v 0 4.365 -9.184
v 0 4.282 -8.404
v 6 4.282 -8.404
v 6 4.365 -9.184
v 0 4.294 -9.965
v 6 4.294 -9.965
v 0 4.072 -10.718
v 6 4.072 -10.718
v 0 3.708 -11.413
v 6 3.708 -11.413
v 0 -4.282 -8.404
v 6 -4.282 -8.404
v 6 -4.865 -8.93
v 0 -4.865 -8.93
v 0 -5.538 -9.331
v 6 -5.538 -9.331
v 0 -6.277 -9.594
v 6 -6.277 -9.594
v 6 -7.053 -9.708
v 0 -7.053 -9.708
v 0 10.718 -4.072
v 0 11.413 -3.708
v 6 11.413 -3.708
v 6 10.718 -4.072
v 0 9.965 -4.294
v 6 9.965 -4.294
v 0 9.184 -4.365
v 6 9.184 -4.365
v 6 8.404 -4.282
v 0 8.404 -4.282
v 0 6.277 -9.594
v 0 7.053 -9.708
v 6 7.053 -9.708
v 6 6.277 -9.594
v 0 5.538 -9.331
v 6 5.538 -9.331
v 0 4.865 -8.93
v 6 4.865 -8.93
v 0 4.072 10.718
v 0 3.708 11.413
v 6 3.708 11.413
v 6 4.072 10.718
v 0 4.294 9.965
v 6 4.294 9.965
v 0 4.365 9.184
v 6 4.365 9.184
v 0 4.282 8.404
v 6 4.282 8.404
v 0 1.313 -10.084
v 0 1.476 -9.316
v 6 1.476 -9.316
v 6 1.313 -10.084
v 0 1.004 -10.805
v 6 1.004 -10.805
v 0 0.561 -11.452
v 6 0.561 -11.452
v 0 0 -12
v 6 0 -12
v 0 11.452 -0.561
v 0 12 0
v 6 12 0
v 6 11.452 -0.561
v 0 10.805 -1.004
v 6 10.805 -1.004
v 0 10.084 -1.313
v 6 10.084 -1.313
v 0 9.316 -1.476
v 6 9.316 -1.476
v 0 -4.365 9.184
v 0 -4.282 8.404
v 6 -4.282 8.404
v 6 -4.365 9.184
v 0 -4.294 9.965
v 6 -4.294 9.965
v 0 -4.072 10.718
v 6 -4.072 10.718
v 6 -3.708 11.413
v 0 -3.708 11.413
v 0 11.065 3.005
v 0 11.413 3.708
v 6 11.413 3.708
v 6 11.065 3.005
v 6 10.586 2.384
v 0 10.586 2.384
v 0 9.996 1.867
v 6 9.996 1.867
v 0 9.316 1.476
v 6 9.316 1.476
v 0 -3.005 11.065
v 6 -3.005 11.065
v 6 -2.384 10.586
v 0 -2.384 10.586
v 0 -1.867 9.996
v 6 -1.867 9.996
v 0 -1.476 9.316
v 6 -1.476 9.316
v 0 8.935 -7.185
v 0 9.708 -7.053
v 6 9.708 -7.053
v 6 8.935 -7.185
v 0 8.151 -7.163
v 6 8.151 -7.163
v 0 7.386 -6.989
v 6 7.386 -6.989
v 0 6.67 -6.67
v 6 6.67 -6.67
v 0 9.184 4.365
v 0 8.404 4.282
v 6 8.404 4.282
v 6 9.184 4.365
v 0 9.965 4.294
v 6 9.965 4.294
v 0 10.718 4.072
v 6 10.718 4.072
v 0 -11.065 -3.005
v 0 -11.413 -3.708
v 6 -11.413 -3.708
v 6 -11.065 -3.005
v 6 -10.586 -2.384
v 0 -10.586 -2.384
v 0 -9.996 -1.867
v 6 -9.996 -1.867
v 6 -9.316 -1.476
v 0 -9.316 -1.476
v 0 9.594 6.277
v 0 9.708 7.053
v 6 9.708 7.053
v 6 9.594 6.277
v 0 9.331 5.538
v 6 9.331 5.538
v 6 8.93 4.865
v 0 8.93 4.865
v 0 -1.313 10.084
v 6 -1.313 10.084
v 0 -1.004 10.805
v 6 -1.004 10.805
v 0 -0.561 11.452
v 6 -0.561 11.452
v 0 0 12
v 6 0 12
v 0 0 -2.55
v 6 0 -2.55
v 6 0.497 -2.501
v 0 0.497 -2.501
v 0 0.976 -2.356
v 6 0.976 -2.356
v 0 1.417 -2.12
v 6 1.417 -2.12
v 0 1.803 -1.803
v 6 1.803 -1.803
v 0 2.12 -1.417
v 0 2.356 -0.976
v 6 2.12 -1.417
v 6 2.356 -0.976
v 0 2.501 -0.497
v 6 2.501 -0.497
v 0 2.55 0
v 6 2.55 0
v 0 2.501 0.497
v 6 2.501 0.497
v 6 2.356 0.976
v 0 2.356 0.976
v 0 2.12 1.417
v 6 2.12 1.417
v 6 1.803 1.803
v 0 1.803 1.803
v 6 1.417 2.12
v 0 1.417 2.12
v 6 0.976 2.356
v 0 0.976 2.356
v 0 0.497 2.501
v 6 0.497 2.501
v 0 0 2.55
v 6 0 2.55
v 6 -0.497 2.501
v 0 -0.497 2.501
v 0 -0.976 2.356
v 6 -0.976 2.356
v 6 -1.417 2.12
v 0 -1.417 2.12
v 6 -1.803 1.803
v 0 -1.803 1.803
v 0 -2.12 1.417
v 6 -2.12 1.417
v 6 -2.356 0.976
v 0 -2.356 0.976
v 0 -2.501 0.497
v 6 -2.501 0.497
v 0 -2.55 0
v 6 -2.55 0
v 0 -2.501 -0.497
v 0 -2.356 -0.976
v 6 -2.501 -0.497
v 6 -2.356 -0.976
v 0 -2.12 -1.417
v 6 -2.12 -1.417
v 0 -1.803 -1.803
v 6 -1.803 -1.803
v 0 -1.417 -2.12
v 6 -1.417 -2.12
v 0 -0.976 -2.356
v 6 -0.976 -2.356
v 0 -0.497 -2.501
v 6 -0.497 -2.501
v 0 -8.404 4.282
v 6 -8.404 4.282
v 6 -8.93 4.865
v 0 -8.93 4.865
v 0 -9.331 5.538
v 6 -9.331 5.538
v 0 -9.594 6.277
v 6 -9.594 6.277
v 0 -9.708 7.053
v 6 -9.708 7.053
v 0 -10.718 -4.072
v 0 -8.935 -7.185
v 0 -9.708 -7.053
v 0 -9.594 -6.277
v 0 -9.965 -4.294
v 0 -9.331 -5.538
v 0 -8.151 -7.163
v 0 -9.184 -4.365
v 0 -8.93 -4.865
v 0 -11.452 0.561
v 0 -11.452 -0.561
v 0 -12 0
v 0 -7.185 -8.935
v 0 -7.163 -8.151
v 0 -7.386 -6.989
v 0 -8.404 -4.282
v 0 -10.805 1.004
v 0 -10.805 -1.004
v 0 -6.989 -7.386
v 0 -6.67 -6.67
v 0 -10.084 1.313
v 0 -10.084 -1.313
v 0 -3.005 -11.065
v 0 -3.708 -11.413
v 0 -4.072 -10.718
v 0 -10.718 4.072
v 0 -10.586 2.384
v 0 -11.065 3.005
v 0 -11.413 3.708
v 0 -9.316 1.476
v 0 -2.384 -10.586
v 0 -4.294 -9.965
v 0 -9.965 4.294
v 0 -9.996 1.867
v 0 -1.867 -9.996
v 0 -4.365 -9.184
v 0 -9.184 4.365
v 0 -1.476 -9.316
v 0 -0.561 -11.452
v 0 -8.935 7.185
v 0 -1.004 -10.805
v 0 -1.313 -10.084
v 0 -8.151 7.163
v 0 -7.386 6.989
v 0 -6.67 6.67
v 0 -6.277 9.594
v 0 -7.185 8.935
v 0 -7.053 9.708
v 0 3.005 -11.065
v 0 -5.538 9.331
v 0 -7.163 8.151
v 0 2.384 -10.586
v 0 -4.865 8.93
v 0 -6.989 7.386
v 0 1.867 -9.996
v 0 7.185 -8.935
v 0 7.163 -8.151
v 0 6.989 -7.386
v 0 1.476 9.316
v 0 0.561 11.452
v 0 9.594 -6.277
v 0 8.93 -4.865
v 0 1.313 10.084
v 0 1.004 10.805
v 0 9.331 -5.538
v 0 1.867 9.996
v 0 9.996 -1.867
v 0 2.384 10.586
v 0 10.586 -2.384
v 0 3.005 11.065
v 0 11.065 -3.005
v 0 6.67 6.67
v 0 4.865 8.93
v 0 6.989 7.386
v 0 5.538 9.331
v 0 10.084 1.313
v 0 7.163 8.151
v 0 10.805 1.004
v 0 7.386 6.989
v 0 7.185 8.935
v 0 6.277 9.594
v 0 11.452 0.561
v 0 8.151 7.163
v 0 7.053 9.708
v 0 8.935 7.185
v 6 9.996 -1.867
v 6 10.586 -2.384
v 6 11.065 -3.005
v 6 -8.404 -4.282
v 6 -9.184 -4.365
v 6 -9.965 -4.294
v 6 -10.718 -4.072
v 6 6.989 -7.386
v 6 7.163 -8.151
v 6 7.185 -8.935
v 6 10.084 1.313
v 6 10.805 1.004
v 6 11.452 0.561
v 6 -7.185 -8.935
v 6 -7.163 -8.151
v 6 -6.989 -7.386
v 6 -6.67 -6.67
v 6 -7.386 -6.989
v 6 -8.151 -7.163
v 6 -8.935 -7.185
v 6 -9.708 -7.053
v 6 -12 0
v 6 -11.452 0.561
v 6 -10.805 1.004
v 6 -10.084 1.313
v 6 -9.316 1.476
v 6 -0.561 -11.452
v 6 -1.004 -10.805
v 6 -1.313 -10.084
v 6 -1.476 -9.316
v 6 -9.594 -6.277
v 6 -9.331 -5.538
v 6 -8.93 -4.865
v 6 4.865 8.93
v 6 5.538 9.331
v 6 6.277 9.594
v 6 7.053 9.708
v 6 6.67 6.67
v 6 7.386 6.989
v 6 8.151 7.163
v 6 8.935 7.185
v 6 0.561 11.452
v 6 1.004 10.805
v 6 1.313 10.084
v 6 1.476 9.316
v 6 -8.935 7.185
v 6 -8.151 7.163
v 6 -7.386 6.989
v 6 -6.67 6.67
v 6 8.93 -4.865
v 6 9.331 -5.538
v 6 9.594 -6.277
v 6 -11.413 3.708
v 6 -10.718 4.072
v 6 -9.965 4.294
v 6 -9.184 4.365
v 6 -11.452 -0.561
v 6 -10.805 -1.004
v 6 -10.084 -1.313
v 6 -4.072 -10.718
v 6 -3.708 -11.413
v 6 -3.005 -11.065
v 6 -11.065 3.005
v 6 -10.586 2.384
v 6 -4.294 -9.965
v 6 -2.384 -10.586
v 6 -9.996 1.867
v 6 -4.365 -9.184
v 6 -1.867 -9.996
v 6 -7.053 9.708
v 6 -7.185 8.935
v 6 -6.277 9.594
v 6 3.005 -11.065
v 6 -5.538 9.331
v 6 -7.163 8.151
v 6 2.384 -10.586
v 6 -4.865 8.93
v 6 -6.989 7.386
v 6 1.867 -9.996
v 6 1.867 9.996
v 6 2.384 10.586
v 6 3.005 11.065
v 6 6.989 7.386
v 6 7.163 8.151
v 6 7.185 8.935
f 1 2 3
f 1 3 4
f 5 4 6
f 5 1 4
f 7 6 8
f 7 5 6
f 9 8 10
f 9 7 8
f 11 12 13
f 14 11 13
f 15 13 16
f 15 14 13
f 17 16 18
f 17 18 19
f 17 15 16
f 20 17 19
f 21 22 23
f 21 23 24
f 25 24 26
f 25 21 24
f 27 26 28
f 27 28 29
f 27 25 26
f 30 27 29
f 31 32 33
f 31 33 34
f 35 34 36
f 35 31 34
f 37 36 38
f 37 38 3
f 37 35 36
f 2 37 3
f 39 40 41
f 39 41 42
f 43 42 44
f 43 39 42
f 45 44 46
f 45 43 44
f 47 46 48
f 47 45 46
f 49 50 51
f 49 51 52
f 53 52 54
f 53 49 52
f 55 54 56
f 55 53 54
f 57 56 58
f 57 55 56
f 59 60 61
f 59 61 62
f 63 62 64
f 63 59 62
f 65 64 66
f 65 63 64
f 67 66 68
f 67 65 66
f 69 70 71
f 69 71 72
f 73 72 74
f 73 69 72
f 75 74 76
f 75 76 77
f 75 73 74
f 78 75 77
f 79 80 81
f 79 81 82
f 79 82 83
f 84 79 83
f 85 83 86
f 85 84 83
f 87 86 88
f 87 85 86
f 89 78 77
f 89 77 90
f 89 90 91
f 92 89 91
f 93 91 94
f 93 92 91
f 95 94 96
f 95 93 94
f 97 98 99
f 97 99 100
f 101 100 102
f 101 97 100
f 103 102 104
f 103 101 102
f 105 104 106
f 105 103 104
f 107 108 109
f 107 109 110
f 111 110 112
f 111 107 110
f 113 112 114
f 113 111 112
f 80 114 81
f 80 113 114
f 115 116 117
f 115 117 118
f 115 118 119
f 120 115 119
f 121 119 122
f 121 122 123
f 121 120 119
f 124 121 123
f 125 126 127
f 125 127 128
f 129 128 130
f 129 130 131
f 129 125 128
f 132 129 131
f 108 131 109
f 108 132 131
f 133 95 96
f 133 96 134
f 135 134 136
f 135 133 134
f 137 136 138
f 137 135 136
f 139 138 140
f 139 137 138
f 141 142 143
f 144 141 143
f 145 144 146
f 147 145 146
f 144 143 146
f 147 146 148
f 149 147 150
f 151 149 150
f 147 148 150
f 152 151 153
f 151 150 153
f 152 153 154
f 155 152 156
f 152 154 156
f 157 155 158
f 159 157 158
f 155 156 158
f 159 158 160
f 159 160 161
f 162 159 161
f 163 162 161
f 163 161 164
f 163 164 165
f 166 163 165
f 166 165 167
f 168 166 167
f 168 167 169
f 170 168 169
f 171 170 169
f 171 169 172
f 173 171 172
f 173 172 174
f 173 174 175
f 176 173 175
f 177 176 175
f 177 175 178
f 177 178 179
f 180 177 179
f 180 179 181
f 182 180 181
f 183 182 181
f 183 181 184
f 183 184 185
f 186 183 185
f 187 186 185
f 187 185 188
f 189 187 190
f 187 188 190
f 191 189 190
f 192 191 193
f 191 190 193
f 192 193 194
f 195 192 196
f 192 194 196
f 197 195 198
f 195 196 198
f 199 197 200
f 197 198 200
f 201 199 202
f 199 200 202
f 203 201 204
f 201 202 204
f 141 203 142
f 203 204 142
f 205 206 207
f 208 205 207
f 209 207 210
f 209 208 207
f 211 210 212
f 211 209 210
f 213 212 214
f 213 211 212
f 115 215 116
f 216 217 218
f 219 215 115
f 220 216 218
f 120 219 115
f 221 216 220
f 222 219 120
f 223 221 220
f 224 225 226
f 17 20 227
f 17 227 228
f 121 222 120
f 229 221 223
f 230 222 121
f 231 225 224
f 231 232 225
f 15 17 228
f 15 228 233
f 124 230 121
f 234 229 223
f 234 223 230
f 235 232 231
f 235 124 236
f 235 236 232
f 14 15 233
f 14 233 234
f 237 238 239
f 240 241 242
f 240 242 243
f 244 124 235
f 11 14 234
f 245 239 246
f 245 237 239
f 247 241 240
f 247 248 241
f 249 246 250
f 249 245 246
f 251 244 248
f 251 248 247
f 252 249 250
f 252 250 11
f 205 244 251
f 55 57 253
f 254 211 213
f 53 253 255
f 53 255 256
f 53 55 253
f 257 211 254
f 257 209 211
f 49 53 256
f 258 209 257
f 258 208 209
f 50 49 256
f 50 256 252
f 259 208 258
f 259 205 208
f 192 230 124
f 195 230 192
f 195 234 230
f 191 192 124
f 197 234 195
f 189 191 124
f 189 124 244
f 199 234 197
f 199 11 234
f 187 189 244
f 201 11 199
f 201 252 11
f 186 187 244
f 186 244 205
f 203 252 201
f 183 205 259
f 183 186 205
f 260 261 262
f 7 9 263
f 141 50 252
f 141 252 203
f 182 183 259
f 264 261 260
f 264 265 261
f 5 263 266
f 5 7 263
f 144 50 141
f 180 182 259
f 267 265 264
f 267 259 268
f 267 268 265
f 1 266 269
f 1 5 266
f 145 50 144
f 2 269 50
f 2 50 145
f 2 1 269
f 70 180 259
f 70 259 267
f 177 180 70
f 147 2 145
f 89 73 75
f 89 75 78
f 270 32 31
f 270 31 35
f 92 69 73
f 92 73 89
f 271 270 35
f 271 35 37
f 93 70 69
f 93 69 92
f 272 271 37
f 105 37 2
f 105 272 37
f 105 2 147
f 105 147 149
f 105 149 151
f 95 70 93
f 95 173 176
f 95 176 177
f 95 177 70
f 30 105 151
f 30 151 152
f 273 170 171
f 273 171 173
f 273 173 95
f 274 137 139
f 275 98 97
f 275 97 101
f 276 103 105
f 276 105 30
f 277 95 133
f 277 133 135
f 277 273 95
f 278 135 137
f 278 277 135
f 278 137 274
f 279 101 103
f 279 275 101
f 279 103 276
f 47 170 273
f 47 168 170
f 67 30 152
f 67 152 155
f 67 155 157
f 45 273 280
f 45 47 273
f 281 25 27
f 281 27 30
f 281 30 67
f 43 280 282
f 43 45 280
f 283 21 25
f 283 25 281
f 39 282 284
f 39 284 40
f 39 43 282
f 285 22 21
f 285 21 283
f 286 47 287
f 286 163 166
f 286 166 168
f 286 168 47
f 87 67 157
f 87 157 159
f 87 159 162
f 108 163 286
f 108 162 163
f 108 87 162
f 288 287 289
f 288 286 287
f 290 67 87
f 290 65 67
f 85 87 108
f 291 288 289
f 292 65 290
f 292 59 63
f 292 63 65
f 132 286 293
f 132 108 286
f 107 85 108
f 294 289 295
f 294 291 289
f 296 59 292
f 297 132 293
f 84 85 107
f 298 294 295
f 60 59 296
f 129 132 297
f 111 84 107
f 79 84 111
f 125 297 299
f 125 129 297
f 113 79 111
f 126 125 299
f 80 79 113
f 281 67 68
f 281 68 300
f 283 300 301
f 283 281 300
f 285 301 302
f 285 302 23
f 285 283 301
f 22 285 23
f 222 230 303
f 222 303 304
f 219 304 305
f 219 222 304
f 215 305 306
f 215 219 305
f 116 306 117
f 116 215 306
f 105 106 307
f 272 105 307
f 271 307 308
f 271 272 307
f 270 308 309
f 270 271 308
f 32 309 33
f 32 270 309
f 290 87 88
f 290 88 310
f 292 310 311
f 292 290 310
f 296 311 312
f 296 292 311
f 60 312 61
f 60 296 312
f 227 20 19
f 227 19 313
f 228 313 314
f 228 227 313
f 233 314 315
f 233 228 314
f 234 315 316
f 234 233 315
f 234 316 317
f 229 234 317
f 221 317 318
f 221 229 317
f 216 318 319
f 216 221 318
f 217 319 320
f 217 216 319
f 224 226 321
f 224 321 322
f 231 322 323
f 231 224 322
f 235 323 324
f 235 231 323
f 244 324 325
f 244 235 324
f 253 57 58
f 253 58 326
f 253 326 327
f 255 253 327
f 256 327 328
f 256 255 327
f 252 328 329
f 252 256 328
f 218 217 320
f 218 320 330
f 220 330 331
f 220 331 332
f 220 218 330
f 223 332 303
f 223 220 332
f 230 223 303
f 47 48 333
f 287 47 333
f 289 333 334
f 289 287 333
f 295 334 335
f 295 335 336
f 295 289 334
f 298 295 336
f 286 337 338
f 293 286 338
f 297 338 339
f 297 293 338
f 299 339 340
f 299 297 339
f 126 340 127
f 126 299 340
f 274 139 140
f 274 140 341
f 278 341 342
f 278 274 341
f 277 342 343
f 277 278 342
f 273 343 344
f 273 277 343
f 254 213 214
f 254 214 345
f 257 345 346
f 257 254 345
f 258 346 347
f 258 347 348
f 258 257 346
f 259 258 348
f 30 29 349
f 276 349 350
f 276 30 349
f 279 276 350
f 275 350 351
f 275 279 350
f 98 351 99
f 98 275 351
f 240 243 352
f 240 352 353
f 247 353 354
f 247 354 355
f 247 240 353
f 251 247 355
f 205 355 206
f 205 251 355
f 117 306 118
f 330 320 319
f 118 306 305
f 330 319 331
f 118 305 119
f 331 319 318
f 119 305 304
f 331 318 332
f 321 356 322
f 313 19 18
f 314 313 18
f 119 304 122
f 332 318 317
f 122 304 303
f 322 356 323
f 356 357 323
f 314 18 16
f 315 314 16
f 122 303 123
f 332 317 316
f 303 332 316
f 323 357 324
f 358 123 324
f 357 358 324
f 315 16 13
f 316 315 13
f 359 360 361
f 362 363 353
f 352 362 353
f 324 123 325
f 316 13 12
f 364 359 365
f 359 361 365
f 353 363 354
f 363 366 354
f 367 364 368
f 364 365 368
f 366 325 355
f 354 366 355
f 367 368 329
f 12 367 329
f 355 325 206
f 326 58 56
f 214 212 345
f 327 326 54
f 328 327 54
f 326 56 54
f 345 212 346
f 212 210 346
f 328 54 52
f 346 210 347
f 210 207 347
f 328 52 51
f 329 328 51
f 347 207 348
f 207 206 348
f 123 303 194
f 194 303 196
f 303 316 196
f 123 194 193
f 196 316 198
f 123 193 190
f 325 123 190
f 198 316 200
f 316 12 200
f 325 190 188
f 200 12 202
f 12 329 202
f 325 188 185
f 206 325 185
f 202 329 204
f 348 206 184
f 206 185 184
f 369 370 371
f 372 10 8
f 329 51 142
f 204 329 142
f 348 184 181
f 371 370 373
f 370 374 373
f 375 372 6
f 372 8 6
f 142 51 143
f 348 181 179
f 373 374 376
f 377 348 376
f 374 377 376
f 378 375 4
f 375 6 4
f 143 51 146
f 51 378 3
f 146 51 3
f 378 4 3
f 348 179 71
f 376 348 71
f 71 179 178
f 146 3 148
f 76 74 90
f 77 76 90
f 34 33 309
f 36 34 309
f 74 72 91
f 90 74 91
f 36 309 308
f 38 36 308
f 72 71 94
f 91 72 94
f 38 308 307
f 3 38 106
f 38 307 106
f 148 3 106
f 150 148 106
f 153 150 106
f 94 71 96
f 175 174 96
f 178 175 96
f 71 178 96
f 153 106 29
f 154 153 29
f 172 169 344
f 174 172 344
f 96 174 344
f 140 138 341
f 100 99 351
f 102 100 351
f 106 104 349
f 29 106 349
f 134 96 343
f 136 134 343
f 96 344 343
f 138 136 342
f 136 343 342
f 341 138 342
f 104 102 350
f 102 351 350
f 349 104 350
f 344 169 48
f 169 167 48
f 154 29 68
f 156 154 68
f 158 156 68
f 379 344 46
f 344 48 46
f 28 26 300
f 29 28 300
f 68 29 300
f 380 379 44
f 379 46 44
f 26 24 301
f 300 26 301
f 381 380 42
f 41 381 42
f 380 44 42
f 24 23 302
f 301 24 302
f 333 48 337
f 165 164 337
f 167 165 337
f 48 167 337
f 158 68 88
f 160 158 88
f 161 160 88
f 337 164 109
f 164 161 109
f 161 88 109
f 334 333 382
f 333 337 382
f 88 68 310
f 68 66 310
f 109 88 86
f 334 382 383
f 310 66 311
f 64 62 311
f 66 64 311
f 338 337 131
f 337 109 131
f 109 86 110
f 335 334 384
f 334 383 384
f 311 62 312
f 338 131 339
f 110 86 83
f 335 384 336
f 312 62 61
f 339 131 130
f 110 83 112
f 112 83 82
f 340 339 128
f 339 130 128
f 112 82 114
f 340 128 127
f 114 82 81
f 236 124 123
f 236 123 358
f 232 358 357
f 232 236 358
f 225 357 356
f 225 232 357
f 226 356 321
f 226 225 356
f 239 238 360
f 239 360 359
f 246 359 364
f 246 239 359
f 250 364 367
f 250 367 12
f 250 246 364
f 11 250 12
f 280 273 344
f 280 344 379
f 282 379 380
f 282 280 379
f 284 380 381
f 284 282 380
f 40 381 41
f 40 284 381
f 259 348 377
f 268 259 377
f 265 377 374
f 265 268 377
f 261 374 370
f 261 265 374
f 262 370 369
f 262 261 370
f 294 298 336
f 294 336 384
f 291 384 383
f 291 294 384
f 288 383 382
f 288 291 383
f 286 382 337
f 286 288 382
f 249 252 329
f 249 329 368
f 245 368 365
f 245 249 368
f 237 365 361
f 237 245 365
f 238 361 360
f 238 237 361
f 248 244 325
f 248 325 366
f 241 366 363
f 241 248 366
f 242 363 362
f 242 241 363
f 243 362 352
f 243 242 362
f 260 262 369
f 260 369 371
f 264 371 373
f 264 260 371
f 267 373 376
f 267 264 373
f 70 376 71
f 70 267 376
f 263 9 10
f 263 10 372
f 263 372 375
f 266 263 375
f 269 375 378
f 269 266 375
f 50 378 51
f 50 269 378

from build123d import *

# Parameters (mm, degrees)
EXTRUDE_1_DEPTH          = 6
PATTERN_CIRCULAR_1_COUNT = 20
SKETCH_2_R               = 2.55
CUT_EXTRUDE_1_DEPTH      = 19


with BuildPart() as part:
    # 스케치1 → 보스-돌출1 (new body)
    with BuildSketch(Plane(origin=(0, 0, 0), x_dir=(0, 0, -1), z_dir=(1, 0, 0))):
        with BuildLine():
            ThreePointArc((0, 12), (1.10558919, 10.60769458), (1.5, 8.874119675))
            ThreePointArc((1.5, 8.874119675), (0, -9), (-1.5, 8.874119675))
            ThreePointArc((-1.5, 8.874119675), (-1.10558919, 10.60769458), (0, 12))
        make_face()
    extrude_1 = extrude(amount=EXTRUDE_1_DEPTH)

    # 원형 패턴1: 보스-돌출1 ×20 about axis
    pattern_circular_1_axis = Axis((0, 0, 0), (1, 0, 0))
    for i in range(1, PATTERN_CIRCULAR_1_COUNT):
        add(extrude_1.rotate(pattern_circular_1_axis, i * 360 / PATTERN_CIRCULAR_1_COUNT))

    # 스케치2 → 컷-돌출1 (cut, through all)
    with BuildSketch(Plane(origin=(6, 0, 0), x_dir=(0, 0, -1), z_dir=(1, 0, 0))):
        Circle(SKETCH_2_R)
    extrude(amount=-CUT_EXTRUDE_1_DEPTH, mode=Mode.SUBTRACT)


solid = part.part
